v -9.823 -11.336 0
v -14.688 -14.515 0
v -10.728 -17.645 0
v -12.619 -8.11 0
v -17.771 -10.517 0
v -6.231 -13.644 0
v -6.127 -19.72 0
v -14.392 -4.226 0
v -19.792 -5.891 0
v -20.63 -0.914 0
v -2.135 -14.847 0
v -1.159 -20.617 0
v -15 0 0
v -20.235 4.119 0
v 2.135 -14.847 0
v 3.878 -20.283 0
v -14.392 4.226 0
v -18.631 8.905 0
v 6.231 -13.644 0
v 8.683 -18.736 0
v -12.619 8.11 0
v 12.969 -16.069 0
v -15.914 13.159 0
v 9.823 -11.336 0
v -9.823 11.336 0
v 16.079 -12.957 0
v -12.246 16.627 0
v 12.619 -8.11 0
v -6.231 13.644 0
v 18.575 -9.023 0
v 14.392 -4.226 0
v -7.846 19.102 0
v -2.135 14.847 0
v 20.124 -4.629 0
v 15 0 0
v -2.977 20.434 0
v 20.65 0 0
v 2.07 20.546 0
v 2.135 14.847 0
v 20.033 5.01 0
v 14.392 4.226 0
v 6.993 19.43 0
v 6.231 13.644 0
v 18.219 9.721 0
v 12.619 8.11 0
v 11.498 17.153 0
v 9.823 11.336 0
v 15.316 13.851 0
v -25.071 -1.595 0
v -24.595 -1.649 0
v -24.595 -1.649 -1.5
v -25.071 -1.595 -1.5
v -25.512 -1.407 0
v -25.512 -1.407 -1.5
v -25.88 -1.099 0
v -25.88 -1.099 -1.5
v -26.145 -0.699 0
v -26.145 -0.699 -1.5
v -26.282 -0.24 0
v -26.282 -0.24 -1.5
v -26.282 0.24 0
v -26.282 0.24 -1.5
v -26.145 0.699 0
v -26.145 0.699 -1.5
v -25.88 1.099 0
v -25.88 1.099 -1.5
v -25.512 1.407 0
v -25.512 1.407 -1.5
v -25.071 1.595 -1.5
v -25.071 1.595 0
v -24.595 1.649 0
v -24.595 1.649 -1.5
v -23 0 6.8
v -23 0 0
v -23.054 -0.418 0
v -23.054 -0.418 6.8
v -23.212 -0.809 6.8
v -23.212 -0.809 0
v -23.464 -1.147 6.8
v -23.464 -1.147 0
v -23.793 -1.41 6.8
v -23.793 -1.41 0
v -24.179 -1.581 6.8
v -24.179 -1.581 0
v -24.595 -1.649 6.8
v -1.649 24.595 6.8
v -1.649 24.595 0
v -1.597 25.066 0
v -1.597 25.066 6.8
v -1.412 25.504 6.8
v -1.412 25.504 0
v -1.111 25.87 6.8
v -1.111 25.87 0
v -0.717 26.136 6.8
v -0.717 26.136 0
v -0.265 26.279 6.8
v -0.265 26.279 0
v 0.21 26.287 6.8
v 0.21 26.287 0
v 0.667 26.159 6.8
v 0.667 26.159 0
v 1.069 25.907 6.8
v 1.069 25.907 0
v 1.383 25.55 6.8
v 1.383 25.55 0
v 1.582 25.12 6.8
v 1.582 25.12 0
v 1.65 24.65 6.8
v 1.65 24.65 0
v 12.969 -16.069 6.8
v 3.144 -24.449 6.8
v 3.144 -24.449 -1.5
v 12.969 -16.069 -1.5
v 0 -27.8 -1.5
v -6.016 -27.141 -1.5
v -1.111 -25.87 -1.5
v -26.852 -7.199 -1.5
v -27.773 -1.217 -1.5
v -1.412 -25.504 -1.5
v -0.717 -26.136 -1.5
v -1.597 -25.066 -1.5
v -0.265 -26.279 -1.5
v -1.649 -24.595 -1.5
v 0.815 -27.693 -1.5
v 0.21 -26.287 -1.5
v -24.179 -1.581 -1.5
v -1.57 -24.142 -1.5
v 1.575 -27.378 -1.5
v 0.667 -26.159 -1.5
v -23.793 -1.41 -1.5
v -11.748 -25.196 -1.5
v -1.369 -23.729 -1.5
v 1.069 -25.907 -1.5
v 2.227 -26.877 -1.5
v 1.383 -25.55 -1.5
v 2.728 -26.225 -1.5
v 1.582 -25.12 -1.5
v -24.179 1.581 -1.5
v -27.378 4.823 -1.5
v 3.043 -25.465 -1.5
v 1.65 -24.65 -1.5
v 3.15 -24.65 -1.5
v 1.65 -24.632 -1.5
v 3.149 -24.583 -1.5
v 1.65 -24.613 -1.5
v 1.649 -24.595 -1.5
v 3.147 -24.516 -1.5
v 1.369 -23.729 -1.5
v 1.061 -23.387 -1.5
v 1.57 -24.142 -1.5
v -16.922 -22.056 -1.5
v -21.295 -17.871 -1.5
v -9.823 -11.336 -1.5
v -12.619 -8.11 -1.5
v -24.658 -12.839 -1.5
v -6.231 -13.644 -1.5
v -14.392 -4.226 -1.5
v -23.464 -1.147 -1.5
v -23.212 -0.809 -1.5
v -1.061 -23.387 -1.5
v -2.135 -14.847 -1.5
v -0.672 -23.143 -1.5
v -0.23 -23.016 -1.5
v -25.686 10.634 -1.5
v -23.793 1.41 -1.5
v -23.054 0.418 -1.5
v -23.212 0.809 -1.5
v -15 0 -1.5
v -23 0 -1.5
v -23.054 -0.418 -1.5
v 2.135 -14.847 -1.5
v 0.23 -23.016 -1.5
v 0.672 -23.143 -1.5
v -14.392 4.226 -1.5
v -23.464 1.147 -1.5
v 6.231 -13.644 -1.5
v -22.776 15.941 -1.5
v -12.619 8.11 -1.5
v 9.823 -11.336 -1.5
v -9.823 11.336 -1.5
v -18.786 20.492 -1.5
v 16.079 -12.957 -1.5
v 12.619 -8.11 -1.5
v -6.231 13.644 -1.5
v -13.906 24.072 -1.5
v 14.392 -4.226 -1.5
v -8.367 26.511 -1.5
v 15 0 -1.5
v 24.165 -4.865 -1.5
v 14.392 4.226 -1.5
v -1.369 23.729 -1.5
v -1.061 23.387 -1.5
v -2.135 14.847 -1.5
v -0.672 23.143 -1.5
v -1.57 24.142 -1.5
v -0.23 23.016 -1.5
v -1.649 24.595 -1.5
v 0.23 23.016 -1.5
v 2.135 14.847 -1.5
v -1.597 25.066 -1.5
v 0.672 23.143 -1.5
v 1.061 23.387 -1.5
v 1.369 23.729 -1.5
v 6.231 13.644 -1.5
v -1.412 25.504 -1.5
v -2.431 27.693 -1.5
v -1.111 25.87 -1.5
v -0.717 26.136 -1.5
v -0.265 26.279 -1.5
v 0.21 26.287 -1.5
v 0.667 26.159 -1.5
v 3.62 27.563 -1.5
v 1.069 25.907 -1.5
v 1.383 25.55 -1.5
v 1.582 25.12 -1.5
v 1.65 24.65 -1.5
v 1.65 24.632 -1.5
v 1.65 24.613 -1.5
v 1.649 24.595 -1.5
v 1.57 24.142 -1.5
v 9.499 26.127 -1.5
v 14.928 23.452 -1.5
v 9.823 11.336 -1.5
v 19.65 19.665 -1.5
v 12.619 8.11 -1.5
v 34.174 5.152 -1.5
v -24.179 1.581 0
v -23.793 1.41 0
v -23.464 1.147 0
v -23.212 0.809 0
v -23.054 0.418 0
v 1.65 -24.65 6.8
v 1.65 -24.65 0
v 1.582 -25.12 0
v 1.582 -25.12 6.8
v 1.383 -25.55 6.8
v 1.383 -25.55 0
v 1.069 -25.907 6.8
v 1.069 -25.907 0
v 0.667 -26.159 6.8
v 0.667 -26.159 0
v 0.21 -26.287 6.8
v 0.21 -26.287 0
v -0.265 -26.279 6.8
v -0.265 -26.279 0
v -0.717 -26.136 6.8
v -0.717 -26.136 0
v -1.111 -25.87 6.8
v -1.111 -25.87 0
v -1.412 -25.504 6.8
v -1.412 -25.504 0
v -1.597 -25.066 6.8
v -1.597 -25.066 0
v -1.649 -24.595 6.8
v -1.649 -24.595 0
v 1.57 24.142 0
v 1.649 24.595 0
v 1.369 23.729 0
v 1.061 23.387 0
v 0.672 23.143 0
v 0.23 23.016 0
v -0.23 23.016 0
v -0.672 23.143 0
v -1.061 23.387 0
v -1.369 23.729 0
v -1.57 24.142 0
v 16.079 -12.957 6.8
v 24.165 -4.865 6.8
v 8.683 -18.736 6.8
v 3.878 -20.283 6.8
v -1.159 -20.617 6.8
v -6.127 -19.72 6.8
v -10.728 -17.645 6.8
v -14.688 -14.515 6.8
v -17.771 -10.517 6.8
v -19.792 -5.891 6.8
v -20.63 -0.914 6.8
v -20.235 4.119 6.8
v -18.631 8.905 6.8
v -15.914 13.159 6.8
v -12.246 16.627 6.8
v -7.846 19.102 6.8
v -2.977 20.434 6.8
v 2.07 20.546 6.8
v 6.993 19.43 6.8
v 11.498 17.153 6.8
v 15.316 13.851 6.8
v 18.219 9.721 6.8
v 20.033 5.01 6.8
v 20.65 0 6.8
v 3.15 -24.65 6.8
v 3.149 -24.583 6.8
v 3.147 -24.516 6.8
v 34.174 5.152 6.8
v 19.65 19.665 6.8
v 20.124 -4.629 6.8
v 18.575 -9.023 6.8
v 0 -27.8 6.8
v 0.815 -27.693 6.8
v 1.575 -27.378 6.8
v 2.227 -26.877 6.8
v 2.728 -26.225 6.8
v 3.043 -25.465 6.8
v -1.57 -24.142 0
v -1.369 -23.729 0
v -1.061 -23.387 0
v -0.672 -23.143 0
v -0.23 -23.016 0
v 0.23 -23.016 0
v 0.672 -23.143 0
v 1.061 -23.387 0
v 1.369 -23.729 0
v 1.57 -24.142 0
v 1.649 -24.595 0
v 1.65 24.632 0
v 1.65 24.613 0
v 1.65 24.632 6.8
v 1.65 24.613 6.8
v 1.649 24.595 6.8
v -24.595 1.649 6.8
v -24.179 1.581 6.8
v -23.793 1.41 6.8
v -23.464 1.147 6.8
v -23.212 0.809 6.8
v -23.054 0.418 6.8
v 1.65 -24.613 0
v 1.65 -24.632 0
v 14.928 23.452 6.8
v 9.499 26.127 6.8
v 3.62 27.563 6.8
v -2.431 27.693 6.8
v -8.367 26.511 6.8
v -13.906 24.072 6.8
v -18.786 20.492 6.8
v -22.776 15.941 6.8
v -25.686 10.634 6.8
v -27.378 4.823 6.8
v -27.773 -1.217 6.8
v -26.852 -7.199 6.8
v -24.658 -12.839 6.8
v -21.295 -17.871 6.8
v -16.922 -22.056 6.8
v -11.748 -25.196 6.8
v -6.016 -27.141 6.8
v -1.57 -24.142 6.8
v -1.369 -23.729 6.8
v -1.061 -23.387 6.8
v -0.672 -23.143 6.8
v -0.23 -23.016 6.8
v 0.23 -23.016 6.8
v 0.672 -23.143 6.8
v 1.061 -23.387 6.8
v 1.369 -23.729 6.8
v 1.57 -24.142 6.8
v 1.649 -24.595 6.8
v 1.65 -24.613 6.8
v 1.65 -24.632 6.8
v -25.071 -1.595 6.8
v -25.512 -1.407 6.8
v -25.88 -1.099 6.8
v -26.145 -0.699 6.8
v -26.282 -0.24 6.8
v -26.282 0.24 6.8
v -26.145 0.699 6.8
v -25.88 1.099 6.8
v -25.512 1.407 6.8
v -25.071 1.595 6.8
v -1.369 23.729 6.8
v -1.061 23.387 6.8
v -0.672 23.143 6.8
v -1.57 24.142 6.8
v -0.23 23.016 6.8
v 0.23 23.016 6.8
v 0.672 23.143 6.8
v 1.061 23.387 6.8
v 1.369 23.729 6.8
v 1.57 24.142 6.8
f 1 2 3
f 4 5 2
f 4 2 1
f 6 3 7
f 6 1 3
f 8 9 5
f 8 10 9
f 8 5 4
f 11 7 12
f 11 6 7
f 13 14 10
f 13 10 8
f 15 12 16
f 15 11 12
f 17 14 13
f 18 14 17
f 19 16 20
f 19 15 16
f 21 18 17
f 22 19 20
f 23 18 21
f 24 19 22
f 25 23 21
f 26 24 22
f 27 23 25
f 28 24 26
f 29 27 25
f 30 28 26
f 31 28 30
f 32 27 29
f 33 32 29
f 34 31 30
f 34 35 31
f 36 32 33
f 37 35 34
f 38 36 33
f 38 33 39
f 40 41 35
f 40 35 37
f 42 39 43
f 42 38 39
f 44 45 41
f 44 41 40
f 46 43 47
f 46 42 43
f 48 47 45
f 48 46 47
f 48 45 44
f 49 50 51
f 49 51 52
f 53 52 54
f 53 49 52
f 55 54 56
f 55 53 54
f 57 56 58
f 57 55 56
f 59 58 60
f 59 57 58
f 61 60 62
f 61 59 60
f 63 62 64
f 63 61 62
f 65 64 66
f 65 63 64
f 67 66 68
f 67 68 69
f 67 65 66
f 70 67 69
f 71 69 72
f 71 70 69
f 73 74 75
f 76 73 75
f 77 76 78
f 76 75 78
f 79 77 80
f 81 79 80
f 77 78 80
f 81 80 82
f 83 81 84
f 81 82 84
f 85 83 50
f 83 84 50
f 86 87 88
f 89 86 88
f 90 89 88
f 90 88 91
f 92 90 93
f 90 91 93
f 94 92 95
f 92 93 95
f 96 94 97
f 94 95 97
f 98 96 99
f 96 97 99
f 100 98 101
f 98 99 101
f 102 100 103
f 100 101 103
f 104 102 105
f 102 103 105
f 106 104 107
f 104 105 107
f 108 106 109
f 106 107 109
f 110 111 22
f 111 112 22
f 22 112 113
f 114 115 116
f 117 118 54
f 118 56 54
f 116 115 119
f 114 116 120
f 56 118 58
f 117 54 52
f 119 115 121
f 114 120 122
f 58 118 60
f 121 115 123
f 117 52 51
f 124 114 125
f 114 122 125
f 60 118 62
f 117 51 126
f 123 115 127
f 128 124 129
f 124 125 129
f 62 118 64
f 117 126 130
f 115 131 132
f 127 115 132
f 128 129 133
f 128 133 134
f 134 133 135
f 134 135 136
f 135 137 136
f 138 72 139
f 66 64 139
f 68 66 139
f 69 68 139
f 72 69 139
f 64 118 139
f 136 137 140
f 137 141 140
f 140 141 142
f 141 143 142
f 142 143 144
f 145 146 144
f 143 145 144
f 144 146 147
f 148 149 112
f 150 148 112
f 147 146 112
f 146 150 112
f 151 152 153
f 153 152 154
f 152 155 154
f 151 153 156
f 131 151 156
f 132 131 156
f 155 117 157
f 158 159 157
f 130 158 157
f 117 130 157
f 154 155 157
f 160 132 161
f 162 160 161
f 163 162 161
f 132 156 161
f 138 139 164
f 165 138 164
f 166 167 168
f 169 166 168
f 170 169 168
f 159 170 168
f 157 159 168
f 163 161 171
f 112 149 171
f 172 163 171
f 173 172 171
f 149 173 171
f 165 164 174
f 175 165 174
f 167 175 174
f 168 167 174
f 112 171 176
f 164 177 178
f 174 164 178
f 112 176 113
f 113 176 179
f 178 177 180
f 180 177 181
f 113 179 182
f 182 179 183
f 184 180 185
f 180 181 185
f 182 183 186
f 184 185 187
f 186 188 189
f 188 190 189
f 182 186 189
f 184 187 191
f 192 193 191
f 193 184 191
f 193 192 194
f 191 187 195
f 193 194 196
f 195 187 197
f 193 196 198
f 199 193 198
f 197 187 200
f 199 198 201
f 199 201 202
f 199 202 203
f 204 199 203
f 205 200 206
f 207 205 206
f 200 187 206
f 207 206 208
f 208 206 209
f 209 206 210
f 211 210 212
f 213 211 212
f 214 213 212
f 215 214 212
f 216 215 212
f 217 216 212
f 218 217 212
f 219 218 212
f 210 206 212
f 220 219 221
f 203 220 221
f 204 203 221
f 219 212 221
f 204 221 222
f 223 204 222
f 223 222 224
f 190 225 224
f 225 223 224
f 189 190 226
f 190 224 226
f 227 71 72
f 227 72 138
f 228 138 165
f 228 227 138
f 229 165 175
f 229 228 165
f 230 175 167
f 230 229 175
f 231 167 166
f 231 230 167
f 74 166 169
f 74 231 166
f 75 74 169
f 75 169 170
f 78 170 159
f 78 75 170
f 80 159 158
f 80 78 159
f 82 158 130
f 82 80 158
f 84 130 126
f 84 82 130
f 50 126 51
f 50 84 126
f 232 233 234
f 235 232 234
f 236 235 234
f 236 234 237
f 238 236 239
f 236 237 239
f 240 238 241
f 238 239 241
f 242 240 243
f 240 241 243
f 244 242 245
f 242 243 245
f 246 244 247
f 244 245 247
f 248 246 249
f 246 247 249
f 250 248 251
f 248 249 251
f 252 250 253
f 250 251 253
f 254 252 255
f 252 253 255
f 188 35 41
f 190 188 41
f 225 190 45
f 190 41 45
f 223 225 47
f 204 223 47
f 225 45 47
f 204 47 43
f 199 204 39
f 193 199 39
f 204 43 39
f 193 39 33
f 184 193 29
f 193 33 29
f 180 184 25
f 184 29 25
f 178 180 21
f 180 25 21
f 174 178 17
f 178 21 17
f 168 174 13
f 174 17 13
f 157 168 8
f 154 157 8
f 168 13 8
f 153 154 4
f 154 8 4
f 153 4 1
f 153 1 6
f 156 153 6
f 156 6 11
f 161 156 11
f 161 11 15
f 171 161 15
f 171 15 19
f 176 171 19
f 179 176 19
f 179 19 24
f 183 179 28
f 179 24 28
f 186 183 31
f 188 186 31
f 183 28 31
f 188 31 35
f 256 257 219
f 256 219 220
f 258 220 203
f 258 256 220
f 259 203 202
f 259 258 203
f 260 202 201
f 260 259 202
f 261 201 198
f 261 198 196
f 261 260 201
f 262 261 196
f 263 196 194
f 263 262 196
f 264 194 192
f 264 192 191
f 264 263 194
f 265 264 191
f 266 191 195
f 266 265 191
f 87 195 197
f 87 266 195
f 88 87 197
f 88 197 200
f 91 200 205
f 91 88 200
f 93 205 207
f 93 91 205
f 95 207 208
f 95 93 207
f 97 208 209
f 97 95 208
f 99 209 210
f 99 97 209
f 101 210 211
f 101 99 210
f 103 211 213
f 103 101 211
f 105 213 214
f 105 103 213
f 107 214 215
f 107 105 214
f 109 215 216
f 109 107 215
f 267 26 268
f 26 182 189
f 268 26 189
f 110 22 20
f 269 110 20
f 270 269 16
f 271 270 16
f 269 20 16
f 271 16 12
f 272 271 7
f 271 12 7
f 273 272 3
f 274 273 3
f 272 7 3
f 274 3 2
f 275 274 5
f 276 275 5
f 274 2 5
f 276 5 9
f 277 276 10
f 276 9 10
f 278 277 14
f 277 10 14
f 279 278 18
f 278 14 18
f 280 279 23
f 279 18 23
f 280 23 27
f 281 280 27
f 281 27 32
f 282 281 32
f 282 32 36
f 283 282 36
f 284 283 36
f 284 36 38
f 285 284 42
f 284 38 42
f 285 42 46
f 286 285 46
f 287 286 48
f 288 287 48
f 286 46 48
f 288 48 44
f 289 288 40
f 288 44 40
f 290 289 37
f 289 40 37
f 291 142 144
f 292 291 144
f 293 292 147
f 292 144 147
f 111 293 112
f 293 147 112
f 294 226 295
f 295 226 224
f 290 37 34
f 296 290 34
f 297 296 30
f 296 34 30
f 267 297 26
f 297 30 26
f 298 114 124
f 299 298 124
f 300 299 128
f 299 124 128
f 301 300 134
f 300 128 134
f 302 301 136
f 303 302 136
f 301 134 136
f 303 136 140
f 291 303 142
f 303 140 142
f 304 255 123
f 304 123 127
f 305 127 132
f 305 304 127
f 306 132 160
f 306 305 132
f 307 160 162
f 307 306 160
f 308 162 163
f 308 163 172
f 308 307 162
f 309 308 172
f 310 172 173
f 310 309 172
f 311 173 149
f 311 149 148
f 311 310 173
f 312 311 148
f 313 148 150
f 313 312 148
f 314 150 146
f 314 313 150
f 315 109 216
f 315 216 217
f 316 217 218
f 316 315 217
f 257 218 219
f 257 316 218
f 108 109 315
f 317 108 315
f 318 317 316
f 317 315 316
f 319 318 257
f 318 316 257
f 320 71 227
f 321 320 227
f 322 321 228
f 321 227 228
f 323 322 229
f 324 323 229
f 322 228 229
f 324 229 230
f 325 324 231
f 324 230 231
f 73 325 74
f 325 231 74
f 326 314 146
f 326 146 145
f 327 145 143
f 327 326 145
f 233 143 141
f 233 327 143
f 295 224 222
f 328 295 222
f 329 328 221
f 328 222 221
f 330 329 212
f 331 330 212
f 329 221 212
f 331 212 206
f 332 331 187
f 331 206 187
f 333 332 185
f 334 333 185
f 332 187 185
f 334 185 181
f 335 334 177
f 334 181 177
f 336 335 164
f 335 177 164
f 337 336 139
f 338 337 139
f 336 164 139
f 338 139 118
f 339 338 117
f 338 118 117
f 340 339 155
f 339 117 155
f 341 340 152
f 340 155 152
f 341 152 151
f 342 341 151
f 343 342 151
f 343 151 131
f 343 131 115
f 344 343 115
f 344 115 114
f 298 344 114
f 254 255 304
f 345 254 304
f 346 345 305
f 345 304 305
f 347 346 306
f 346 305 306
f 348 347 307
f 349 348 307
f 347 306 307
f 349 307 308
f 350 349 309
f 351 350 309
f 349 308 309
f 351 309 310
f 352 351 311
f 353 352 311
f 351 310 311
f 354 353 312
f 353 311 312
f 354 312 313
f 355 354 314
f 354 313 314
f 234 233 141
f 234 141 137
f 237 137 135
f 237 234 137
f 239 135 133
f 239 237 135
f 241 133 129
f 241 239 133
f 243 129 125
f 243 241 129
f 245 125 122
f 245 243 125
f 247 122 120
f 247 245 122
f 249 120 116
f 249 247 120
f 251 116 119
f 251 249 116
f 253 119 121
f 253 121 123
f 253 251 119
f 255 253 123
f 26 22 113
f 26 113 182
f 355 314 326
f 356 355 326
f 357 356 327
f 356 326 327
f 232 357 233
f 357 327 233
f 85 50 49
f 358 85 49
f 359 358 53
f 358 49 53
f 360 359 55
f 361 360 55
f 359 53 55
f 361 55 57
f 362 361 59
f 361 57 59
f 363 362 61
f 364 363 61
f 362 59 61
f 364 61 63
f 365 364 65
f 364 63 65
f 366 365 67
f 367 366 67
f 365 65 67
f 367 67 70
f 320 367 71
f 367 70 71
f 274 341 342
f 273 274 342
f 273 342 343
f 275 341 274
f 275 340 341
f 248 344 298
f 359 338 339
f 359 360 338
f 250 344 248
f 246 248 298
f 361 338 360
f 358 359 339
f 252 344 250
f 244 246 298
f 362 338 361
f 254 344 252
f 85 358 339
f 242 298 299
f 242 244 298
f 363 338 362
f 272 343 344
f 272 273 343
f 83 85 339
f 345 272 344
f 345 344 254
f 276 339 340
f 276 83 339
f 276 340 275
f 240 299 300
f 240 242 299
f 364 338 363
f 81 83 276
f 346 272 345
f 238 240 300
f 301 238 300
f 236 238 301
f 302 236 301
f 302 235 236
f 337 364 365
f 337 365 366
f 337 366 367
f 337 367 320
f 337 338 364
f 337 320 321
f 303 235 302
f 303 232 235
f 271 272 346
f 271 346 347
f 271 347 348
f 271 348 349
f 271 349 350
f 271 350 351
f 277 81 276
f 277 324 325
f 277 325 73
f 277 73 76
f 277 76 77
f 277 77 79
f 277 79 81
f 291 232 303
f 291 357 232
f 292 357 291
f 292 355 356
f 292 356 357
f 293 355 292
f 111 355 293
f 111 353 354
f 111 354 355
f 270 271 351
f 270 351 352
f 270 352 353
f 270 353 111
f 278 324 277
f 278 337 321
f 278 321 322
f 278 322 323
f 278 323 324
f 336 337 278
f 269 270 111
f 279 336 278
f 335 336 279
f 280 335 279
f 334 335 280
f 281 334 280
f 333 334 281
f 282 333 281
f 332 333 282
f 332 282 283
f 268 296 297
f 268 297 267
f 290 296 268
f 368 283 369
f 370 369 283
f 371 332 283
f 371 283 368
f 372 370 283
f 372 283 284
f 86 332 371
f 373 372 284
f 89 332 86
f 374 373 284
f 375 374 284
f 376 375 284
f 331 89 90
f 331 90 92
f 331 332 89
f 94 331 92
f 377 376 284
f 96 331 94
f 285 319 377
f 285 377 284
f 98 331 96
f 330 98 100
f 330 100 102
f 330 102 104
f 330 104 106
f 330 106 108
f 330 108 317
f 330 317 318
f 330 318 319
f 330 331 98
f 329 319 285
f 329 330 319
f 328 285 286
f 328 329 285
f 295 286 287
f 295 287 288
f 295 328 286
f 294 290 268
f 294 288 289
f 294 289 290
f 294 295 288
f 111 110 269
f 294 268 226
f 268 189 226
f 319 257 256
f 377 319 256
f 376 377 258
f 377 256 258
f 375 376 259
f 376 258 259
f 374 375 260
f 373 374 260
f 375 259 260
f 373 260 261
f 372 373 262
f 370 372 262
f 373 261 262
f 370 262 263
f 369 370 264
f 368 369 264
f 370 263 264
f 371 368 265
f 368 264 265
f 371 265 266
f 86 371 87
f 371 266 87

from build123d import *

# Parameters (mm, degrees)
F0_R     = 15
F1_DEPTH = 1.5
F2_DEPTH = 6.8


with BuildPart() as f1:
    # F0 (on Top) → F1 (new body)
    with BuildSketch(Plane.XY):
        with BuildLine():
            ThreePointArc((24.1652138662, -4.8646622494), (24.5285040494, -2.4443790825), (24.65, 0))
            ThreePointArc((24.65, 0), (18.0037803541, 16.8370541652), (1.6490756219, 24.5947768763))
            ThreePointArc((1.6490756219, 24.5947768763), (0, 23), (-1.6490756219, 24.5947768763))
            ThreePointArc((-1.6490756219, 24.5947768763), (-17.4301821562, 17.4301821562), (-24.5947768763, 1.6490756219))
            ThreePointArc((-24.5947768763, 1.6490756219), (-23.4639101733, 1.1470357113), (-23, 0))
            ThreePointArc((-23, 0), (-23.4639101733, -1.1470357113), (-24.5947768763, -1.6490756219))
            ThreePointArc((-24.5947768763, -1.6490756219), (-17.9529932576, -16.8911969112), (-3.1435634706, -24.4487322515))
            ThreePointArc((-3.1435634706, -24.4487322515), (0, -21.5), (3.1435634706, -24.4487322515))
            Line((3.1435634706, -24.4487322515), (12.969203616, -16.0692954907))
            ThreePointArc((12.969203616, -16.0692954907), (-18.6311104697, 8.9052918349), (20.65, 0))
            ThreePointArc((20.65, 0), (19.4738226895, -6.8696964896), (16.0792755585, -12.9568282197))
            Line((16.0792755585, -12.9568282197), (24.1652138662, -4.8646622494))
        make_face()
        with BuildLine():
            ThreePointArc((1.6490756219, 24.5947768763), (18.0037803541, 16.8370541652), (24.65, 0))
            ThreePointArc((24.65, 0), (24.5285040494, -2.4443790825), (24.1652138662, -4.8646622494))
            Line((24.1652138662, -4.8646622494), (27.771636901, -1.2554616043))
            ThreePointArc((27.771636901, -1.2554616043), (27.7929083207, -0.6278909749), (27.8, 0))
            ThreePointArc((27.8, 0), (25.6818028962, 10.6435426433), (19.65, 19.6651341211))
            ThreePointArc((19.65, 19.6651341211), (-25.6858981613, 10.6336557988), (7.1e-09, -27.8))
            ThreePointArc((7.1e-09, -27.8), (-2.2974435124, -26.8050529709), (-3.1435634706, -24.4487322515))
            ThreePointArc((-3.1435634706, -24.4487322515), (-17.9529932576, -16.8911969112), (-24.5947768763, -1.6490756219))
            ThreePointArc((-24.5947768763, -1.6490756219), (-26.3, 0), (-24.5947768763, 1.6490756219))
            ThreePointArc((-24.5947768763, 1.6490756219), (-17.4301821562, 17.4301821562), (-1.6490756219, 24.5947768763))
            ThreePointArc((-1.6490756219, 24.5947768763), (-0.0276154299, 26.2997688893), (1.65, 24.65))
            ThreePointArc((1.65, 24.65), (1.6497688893, 24.6223845701), (1.6490756219, 24.5947768763))
        make_face()
        with BuildLine():
            ThreePointArc((3.15, -24.65), (3.1483904564, -24.549314679), (3.1435634706, -24.4487322515))
            ThreePointArc((3.1435634706, -24.4487322515), (2.3974318813, -24.5331371898), (1.6490756219, -24.5947768763))
            ThreePointArc((1.6490756219, -24.5947768763), (1.6497688893, -24.6223845701), (1.65, -24.65))
            ThreePointArc((1.65, -24.65), (-0.0276154299, -26.2997688893), (-1.6490756219, -24.5947768763))
            ThreePointArc((-1.6490756219, -24.5947768763), (-2.3974318813, -24.5331371898), (-3.1435634706, -24.4487322515))
            ThreePointArc((-3.1435634706, -24.4487322515), (-2.2974435124, -26.8050529709), (7.1e-09, -27.8))
            ThreePointArc((7.1e-09, -27.8), (2.2273863633, -26.8773863582), (3.15, -24.65))
        make_face()
        with BuildLine():
            ThreePointArc((1.6490756219, -24.5947768763), (2.3974318813, -24.5331371898), (3.1435634706, -24.4487322515))
            ThreePointArc((3.1435634706, -24.4487322515), (0, -21.5), (-3.1435634706, -24.4487322515))
            ThreePointArc((-3.1435634706, -24.4487322515), (-2.3974318813, -24.5331371898), (-1.6490756219, -24.5947768763))
            ThreePointArc((-1.6490756219, -24.5947768763), (0, -23), (1.6490756219, -24.5947768763))
        make_face()
        with BuildLine():
            Line((12.969203616, -16.0692954907), (16.0792755585, -12.9568282197))
            ThreePointArc((16.0792755585, -12.9568282197), (19.4738226895, -6.8696964896), (20.65, 0))
            ThreePointArc((20.65, 0), (-18.6311104697, 8.9052918349), (12.969203616, -16.0692954907))
        make_face()
        Circle(F0_R, mode=Mode.SUBTRACT)
        with BuildLine():
            ThreePointArc((27.8, 0), (27.7929083207, -0.6278909749), (27.771636901, -1.2554616043))
            Line((27.771636901, -1.2554616043), (34.1742395873, 5.1520722659))
            Line((34.1742395873, 5.1520722659), (19.65, 19.6651341211))
            ThreePointArc((19.65, 19.6651341211), (25.6818028962, 10.6435426433), (27.8, 0))
        make_face()
    extrude(amount=-F1_DEPTH)

    # F0 (on Top) → F2 (join)
    with BuildSketch(Plane.XY):
        with BuildLine():
            ThreePointArc((24.1652138662, -4.8646622494), (24.5285040494, -2.4443790825), (24.65, 0))
            ThreePointArc((24.65, 0), (18.0037803541, 16.8370541652), (1.6490756219, 24.5947768763))
            ThreePointArc((1.6490756219, 24.5947768763), (0, 23), (-1.6490756219, 24.5947768763))
            ThreePointArc((-1.6490756219, 24.5947768763), (-17.4301821562, 17.4301821562), (-24.5947768763, 1.6490756219))
            ThreePointArc((-24.5947768763, 1.6490756219), (-23.4639101733, 1.1470357113), (-23, 0))
            ThreePointArc((-23, 0), (-23.4639101733, -1.1470357113), (-24.5947768763, -1.6490756219))
            ThreePointArc((-24.5947768763, -1.6490756219), (-17.9529932576, -16.8911969112), (-3.1435634706, -24.4487322515))
            ThreePointArc((-3.1435634706, -24.4487322515), (0, -21.5), (3.1435634706, -24.4487322515))
            Line((3.1435634706, -24.4487322515), (12.969203616, -16.0692954907))
            ThreePointArc((12.969203616, -16.0692954907), (-18.6311104697, 8.9052918349), (20.65, 0))
            ThreePointArc((20.65, 0), (19.4738226895, -6.8696964896), (16.0792755585, -12.9568282197))
            Line((16.0792755585, -12.9568282197), (24.1652138662, -4.8646622494))
        make_face()
        with BuildLine():
            ThreePointArc((1.6490756219, 24.5947768763), (18.0037803541, 16.8370541652), (24.65, 0))
            ThreePointArc((24.65, 0), (24.5285040494, -2.4443790825), (24.1652138662, -4.8646622494))
            Line((24.1652138662, -4.8646622494), (27.771636901, -1.2554616043))
            ThreePointArc((27.771636901, -1.2554616043), (27.7929083207, -0.6278909749), (27.8, 0))
            ThreePointArc((27.8, 0), (25.6818028962, 10.6435426433), (19.65, 19.6651341211))
            ThreePointArc((19.65, 19.6651341211), (-25.6858981613, 10.6336557988), (7.1e-09, -27.8))
            ThreePointArc((7.1e-09, -27.8), (-2.2974435124, -26.8050529709), (-3.1435634706, -24.4487322515))
            ThreePointArc((-3.1435634706, -24.4487322515), (-17.9529932576, -16.8911969112), (-24.5947768763, -1.6490756219))
            ThreePointArc((-24.5947768763, -1.6490756219), (-26.3, 0), (-24.5947768763, 1.6490756219))
            ThreePointArc((-24.5947768763, 1.6490756219), (-17.4301821562, 17.4301821562), (-1.6490756219, 24.5947768763))
            ThreePointArc((-1.6490756219, 24.5947768763), (-0.0276154299, 26.2997688893), (1.65, 24.65))
            ThreePointArc((1.65, 24.65), (1.6497688893, 24.6223845701), (1.6490756219, 24.5947768763))
        make_face()
        with BuildLine():
            ThreePointArc((3.15, -24.65), (3.1483904564, -24.549314679), (3.1435634706, -24.4487322515))
            ThreePointArc((3.1435634706, -24.4487322515), (2.3974318813, -24.5331371898), (1.6490756219, -24.5947768763))
            ThreePointArc((1.6490756219, -24.5947768763), (1.6497688893, -24.6223845701), (1.65, -24.65))
            ThreePointArc((1.65, -24.65), (-0.0276154299, -26.2997688893), (-1.6490756219, -24.5947768763))
            ThreePointArc((-1.6490756219, -24.5947768763), (-2.3974318813, -24.5331371898), (-3.1435634706, -24.4487322515))
            ThreePointArc((-3.1435634706, -24.4487322515), (-2.2974435124, -26.8050529709), (7.1e-09, -27.8))
            ThreePointArc((7.1e-09, -27.8), (2.2273863633, -26.8773863582), (3.15, -24.65))
        make_face()
        with BuildLine():
            ThreePointArc((1.6490756219, -24.5947768763), (2.3974318813, -24.5331371898), (3.1435634706, -24.4487322515))
            ThreePointArc((3.1435634706, -24.4487322515), (0, -21.5), (-3.1435634706, -24.4487322515))
            ThreePointArc((-3.1435634706, -24.4487322515), (-2.3974318813, -24.5331371898), (-1.6490756219, -24.5947768763))
            ThreePointArc((-1.6490756219, -24.5947768763), (0, -23), (1.6490756219, -24.5947768763))
        make_face()
        with BuildLine():
            ThreePointArc((27.8, 0), (27.7929083207, -0.6278909749), (27.771636901, -1.2554616043))
            Line((27.771636901, -1.2554616043), (34.1742395873, 5.1520722659))
            Line((34.1742395873, 5.1520722659), (19.65, 19.6651341211))
            ThreePointArc((19.65, 19.6651341211), (25.6818028962, 10.6435426433), (27.8, 0))
        make_face()
    extrude(amount=F2_DEPTH)


solid = f1.part
